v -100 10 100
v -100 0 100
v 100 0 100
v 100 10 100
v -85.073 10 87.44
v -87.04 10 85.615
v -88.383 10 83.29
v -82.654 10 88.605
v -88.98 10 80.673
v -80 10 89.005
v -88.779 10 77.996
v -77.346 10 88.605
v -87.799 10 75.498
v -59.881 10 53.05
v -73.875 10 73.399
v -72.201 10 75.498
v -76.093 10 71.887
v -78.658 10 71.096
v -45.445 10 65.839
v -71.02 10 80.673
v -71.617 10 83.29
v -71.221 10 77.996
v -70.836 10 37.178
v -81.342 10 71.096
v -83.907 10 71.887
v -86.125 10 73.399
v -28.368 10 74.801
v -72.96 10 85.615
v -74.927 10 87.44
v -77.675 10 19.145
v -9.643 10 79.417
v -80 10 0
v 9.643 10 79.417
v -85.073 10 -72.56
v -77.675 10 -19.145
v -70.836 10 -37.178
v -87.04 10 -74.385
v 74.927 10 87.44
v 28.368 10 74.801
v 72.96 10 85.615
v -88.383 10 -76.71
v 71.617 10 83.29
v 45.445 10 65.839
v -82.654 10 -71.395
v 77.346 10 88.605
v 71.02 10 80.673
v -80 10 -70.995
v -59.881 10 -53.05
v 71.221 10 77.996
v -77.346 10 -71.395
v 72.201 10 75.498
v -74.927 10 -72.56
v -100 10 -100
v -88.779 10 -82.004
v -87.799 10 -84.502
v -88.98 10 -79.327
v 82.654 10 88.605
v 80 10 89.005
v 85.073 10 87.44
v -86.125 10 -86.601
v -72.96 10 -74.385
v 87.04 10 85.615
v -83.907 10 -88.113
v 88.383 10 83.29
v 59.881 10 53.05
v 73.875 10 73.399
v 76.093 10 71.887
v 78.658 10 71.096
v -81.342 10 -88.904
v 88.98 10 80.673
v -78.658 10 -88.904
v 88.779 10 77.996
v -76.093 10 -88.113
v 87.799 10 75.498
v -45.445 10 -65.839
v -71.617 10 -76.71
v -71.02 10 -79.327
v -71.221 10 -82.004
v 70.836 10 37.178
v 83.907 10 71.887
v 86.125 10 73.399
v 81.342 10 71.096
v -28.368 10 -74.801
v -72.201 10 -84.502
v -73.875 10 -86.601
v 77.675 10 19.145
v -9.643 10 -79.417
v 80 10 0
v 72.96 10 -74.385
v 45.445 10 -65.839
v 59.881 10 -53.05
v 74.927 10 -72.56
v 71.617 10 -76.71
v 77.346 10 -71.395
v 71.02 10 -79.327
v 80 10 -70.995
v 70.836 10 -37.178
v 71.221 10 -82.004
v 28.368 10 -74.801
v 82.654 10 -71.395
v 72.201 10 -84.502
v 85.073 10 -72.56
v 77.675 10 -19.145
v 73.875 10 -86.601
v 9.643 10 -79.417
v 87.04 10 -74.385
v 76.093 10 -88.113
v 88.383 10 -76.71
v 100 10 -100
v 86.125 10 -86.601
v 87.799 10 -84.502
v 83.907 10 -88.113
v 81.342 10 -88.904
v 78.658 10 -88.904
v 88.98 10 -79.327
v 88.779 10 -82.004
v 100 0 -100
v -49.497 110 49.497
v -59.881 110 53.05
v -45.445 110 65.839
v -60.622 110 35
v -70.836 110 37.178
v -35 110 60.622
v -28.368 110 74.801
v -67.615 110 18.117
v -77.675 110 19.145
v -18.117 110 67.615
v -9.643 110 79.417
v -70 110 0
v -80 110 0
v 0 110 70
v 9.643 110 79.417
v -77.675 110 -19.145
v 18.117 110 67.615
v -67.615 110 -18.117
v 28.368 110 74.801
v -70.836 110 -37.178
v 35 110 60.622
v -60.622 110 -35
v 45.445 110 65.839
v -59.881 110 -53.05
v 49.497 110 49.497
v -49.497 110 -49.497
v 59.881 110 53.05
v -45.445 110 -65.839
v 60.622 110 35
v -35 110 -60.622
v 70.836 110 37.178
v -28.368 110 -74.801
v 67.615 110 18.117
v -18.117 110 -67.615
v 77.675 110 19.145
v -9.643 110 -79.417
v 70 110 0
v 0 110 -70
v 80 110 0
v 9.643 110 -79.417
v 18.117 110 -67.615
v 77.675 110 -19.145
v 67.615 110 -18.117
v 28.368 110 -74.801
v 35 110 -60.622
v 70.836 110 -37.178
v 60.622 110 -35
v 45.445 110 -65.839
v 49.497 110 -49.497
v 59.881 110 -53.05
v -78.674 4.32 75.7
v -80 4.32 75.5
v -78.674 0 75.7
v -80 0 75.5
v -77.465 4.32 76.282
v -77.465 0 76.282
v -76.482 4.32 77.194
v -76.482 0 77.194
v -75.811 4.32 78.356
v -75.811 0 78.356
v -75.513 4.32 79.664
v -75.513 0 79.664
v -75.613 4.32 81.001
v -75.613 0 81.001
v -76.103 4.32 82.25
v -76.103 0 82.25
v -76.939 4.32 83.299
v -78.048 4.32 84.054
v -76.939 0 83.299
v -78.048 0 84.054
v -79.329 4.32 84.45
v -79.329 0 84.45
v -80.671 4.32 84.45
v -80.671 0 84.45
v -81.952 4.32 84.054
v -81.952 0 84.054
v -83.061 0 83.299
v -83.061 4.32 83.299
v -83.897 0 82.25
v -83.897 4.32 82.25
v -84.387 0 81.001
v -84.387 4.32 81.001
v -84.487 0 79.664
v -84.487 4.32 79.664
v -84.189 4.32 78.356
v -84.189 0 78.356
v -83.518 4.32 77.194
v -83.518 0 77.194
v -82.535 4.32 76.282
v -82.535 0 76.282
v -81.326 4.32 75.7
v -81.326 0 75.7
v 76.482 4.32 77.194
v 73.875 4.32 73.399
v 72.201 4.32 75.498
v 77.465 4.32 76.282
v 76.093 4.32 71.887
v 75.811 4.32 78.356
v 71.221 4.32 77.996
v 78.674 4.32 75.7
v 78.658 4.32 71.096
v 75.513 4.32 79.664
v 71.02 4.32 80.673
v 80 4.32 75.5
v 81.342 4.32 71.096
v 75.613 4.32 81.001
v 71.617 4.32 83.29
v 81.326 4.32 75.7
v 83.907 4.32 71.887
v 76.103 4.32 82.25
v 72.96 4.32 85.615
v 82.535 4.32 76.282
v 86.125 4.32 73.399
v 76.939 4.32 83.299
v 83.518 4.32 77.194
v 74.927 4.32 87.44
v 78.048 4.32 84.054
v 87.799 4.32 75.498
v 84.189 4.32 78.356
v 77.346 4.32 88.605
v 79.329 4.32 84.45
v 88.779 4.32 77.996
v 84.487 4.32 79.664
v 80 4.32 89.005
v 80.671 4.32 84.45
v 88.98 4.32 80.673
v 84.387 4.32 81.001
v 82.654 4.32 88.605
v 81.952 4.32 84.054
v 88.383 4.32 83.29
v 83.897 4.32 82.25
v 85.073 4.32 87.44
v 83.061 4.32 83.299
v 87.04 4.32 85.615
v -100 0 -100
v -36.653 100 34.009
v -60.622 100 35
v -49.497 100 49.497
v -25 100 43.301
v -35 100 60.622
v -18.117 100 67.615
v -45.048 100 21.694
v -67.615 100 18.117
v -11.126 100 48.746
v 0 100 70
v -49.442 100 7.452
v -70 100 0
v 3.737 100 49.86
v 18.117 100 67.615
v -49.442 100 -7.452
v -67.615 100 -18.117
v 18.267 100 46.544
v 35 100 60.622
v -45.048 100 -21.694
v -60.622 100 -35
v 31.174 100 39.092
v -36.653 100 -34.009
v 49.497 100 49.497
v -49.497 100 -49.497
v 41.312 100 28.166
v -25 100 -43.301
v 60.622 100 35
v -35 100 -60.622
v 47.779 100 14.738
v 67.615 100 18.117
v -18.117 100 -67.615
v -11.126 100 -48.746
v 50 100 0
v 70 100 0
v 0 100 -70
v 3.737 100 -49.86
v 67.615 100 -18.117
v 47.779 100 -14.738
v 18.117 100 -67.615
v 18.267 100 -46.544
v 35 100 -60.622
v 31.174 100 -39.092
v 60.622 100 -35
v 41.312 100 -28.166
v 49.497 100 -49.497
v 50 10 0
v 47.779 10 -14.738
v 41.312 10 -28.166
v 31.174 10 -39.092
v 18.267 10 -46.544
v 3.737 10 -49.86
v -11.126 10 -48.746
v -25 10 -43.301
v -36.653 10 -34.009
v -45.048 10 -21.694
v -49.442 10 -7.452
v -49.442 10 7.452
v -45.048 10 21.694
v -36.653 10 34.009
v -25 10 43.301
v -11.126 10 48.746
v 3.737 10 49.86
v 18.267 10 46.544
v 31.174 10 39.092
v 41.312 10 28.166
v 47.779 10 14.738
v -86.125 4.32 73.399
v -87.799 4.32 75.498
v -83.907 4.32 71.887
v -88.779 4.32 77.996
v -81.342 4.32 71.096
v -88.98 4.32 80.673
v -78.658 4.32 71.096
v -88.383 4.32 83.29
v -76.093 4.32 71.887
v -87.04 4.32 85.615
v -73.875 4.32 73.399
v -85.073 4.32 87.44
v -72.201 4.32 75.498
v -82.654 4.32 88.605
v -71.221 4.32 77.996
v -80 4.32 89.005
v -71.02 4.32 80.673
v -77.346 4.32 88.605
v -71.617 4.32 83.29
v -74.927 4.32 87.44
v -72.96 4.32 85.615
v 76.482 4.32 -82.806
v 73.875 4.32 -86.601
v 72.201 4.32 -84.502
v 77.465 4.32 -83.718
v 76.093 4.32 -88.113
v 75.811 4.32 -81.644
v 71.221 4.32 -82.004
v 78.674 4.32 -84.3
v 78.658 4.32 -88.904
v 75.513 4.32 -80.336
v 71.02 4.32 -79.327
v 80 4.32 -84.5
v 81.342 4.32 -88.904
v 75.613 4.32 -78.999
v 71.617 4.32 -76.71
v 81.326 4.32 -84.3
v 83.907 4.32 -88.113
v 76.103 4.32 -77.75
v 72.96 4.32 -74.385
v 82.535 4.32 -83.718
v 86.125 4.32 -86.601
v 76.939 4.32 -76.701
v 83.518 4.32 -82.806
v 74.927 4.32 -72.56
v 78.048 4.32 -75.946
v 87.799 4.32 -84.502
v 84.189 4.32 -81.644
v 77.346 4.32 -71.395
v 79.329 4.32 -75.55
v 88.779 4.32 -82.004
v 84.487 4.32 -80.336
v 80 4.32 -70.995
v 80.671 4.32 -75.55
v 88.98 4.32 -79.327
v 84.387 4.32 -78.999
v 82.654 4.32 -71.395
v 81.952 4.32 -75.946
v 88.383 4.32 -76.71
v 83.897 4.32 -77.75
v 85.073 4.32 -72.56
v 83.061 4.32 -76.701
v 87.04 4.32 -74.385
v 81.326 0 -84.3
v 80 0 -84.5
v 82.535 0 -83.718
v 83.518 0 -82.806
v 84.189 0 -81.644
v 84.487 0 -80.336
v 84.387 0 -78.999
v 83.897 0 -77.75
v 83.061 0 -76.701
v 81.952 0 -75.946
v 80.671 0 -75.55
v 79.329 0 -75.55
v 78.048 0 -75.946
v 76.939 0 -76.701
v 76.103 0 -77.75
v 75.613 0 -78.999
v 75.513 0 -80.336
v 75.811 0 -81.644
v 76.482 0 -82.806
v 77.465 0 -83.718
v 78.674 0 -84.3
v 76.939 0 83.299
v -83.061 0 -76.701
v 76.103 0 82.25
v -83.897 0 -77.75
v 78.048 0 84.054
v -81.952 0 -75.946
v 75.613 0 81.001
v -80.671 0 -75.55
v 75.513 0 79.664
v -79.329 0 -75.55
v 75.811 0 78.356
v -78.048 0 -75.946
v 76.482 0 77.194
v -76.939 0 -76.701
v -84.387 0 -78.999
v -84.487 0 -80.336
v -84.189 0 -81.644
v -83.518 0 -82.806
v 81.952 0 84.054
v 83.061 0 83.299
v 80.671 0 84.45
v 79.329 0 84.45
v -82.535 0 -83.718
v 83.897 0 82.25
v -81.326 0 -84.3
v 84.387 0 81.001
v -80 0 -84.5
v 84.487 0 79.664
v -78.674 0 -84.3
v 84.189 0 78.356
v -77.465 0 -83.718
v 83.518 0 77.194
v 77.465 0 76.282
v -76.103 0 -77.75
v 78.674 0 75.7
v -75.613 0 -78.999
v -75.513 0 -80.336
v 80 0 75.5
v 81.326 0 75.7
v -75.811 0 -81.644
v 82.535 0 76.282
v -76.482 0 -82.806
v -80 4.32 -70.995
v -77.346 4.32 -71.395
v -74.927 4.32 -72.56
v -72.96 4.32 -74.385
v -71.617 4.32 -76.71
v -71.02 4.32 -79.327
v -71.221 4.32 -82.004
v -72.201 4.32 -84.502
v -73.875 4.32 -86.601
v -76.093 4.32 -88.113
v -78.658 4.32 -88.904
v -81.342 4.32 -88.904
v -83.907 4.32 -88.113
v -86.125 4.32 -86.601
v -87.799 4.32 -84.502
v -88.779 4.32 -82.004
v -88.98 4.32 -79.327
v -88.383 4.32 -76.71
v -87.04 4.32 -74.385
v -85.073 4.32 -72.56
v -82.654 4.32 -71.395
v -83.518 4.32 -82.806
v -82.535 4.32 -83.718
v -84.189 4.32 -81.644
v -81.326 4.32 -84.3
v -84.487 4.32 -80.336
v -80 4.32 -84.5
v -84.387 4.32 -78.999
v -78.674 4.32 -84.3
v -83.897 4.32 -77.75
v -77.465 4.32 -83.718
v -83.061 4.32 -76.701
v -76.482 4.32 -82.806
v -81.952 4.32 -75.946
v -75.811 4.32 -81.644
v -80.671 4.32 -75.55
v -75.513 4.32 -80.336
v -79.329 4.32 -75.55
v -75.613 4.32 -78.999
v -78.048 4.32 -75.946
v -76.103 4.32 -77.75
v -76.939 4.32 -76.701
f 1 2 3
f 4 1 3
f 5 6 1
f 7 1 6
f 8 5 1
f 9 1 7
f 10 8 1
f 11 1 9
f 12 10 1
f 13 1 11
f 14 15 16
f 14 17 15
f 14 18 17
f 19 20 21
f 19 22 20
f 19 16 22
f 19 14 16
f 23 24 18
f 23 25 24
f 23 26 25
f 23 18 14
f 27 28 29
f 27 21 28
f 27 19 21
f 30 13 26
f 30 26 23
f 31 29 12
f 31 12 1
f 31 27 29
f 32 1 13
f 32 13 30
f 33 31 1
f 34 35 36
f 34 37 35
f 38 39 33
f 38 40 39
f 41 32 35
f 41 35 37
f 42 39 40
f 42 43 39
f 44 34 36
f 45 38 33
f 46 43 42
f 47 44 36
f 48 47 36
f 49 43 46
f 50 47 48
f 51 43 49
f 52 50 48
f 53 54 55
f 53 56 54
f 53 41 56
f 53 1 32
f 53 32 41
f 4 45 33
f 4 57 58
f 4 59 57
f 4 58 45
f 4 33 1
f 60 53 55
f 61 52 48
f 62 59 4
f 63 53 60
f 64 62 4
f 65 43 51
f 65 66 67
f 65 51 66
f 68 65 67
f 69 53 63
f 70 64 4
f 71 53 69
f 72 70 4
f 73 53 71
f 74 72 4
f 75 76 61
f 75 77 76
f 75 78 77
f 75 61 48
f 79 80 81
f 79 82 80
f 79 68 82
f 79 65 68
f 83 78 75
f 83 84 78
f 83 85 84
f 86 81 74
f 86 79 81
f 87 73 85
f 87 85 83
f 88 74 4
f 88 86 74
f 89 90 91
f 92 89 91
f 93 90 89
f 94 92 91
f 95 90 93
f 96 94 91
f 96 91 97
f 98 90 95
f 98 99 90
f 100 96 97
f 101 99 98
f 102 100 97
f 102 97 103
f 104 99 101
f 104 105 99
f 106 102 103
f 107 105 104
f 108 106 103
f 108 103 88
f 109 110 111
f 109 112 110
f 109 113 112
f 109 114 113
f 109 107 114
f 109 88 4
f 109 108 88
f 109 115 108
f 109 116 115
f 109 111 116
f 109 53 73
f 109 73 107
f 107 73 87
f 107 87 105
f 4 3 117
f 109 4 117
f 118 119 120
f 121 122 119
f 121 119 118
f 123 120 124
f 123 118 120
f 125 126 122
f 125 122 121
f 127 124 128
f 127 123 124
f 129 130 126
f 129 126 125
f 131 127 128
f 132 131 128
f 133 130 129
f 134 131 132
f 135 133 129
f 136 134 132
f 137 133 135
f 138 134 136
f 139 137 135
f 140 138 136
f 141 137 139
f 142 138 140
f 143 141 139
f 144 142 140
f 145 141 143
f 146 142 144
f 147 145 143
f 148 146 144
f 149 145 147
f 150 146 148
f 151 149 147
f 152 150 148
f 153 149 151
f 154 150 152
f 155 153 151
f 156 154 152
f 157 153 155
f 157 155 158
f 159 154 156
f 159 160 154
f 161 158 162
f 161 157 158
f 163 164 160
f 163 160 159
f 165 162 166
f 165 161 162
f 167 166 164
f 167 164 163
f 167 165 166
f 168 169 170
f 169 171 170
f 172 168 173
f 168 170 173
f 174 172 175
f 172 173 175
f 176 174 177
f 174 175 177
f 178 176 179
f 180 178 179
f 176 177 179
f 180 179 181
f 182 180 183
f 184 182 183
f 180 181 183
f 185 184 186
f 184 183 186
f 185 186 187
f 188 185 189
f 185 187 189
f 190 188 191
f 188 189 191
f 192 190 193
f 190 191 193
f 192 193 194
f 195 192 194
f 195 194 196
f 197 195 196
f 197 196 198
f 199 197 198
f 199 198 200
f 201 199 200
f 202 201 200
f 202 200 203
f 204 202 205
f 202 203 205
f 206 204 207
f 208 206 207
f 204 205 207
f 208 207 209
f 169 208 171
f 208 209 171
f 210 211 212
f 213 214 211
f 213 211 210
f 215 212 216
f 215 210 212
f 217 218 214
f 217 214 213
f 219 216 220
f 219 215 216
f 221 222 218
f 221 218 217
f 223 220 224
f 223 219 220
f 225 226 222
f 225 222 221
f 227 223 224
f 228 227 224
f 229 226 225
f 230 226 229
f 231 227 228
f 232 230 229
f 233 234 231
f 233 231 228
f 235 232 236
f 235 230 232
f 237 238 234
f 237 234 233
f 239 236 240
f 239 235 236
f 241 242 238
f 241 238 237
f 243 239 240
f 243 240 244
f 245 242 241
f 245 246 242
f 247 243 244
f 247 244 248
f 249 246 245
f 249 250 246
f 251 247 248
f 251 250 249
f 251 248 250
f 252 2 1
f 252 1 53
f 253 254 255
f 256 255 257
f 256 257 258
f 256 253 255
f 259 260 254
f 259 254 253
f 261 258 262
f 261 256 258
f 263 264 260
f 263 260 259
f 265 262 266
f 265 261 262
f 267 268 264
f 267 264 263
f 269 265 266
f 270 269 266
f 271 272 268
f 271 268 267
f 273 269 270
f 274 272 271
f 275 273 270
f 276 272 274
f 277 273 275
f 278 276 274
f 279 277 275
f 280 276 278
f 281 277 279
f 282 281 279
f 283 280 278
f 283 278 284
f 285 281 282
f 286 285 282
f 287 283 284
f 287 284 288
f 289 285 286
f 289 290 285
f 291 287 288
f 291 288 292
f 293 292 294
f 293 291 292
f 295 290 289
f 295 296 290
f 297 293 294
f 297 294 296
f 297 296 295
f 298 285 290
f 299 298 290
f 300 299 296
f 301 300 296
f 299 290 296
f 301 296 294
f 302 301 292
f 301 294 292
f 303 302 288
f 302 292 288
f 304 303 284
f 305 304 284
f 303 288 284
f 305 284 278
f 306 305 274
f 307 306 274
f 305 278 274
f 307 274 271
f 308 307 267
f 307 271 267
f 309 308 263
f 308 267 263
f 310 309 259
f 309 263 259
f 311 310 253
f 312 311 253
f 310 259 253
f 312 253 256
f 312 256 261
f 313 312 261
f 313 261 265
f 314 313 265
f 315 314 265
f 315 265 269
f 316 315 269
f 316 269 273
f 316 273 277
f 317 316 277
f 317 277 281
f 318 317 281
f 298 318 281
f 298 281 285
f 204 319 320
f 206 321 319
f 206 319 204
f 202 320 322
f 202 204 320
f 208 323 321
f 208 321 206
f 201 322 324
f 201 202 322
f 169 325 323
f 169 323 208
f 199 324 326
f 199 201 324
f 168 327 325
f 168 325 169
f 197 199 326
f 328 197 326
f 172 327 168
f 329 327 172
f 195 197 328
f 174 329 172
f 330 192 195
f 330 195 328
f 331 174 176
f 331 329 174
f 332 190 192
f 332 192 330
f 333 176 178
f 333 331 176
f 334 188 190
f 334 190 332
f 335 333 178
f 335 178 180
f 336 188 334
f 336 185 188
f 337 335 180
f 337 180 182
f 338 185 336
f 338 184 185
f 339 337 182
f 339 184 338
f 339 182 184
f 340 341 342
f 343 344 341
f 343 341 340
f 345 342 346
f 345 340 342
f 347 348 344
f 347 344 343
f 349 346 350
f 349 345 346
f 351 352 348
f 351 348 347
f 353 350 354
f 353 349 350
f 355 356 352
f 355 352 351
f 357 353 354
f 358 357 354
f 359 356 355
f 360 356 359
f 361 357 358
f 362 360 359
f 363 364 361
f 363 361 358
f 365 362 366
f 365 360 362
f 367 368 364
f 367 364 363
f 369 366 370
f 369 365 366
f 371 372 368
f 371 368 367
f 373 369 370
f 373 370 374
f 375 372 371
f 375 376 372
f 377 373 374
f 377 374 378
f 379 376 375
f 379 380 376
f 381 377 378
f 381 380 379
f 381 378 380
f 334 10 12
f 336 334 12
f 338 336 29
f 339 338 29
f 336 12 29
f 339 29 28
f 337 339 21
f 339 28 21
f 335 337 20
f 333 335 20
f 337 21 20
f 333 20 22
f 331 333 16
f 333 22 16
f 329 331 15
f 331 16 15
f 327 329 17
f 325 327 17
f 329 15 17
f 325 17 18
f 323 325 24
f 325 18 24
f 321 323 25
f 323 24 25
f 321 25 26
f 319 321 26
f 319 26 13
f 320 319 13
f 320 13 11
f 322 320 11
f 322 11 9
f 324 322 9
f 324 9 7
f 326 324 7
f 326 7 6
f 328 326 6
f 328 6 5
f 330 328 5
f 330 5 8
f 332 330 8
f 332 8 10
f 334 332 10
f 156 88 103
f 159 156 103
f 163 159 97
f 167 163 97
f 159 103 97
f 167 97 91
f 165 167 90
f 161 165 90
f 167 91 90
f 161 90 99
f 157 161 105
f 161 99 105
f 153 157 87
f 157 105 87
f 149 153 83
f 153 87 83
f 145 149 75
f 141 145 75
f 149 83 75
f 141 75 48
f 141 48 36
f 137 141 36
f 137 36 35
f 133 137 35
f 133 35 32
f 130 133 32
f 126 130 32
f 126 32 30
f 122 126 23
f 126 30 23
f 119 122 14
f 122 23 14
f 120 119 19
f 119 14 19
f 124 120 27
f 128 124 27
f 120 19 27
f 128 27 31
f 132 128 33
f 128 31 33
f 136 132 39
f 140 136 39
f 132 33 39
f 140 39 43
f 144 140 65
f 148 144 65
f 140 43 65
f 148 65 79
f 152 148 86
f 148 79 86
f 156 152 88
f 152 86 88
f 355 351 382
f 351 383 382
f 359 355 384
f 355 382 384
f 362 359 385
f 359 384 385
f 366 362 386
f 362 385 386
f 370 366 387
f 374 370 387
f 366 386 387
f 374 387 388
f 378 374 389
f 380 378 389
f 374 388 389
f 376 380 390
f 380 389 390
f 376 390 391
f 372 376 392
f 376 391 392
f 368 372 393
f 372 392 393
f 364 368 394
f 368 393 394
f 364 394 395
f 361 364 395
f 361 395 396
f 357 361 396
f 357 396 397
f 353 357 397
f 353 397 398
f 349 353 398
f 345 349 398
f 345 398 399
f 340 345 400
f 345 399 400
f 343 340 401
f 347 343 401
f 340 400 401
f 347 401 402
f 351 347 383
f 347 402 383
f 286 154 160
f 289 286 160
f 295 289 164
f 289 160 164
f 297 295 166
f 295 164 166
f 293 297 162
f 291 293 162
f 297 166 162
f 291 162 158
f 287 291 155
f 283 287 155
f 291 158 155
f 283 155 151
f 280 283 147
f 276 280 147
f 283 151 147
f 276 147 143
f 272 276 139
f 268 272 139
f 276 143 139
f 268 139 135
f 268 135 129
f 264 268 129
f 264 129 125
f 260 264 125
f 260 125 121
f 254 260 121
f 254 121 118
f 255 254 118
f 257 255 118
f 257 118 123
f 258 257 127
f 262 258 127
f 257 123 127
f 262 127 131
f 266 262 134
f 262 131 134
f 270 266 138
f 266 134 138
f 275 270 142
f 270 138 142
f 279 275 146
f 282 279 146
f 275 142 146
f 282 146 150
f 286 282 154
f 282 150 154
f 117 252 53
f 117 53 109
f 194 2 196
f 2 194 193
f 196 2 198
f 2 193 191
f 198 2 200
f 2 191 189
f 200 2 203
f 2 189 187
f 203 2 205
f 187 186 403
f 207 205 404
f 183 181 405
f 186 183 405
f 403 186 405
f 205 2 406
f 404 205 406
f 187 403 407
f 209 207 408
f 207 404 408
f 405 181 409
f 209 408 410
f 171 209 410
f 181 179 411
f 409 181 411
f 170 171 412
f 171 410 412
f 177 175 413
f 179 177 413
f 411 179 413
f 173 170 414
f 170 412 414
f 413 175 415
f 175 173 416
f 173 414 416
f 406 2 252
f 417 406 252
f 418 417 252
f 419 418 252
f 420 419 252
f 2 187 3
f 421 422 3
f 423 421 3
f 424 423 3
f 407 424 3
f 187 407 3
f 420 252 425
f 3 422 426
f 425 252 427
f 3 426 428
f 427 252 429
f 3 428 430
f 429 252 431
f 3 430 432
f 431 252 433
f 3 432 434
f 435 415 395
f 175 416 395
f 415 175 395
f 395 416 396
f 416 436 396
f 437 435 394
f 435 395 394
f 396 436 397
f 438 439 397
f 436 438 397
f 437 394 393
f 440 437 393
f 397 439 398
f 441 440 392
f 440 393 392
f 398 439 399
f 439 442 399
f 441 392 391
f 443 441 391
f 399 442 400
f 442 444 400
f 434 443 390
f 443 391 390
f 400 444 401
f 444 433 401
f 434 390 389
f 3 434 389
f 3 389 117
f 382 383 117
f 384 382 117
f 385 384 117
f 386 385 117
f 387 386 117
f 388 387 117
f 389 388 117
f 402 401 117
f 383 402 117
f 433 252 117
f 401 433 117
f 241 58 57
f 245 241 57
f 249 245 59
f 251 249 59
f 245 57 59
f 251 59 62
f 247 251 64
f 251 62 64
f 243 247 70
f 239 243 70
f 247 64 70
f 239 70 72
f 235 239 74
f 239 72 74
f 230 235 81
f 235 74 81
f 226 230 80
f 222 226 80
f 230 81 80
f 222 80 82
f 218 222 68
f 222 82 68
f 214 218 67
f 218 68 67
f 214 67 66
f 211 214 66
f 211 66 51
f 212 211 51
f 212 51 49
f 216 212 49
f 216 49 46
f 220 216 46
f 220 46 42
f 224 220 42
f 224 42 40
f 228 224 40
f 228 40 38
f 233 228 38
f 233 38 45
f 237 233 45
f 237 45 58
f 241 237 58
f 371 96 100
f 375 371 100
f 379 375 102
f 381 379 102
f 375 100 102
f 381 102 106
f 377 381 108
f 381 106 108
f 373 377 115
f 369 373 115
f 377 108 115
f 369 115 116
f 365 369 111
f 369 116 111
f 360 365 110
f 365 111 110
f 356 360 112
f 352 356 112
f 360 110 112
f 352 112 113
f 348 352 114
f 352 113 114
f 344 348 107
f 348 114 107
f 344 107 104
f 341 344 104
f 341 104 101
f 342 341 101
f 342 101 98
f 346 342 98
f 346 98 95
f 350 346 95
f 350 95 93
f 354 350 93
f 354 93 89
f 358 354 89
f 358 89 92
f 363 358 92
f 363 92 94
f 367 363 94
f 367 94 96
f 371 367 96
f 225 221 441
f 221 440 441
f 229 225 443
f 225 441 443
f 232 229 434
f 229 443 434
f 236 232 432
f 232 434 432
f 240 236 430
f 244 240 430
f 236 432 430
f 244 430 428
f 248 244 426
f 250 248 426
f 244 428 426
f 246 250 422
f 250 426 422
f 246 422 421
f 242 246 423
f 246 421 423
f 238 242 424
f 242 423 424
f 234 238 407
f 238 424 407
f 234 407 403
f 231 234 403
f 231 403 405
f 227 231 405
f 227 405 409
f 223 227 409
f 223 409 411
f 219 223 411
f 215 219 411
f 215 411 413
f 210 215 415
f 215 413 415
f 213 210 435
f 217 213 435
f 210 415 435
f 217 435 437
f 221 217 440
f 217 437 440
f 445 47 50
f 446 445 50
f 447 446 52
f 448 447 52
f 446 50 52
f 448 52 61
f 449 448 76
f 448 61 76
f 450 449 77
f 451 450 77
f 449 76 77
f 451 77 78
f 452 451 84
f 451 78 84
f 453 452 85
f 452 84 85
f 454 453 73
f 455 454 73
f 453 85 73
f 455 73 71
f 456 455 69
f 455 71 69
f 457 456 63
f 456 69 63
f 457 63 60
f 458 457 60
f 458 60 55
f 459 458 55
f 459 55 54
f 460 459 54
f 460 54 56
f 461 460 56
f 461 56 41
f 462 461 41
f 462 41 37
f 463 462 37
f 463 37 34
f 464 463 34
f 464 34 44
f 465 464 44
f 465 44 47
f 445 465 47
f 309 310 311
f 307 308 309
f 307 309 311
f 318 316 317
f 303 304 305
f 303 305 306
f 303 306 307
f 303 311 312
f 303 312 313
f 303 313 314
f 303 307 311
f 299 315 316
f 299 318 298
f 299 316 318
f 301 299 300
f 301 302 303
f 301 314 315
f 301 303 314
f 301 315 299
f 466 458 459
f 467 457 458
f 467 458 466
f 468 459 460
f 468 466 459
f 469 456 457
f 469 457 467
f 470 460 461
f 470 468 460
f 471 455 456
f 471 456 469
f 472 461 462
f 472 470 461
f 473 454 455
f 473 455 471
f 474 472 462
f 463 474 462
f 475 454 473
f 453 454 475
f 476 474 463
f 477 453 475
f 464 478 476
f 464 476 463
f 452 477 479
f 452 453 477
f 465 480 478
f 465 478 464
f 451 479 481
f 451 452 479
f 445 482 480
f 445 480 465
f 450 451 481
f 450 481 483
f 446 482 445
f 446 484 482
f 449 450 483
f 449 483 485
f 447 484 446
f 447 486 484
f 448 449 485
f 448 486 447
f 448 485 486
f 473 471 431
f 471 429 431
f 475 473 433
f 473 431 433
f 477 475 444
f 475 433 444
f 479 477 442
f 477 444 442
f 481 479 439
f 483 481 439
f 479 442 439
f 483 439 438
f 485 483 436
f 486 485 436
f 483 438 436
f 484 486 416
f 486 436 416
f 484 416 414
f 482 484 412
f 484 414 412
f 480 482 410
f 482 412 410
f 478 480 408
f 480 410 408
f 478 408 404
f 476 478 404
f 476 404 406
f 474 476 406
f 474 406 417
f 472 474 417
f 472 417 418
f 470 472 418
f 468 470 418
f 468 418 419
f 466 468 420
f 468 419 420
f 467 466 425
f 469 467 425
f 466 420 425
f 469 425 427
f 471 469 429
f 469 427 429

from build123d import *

# Parameters (mm, degrees)
SKETCH1_W                               = 200
SKETCH1_H                               = 200
BOSS_EXTRUDE1_DEPTH                     = 10
SKETCH2_R                               = 80
BOSS_EXTRUDE2_DEPTH                     = 100
SKETCH3_R                               = 50
CUT_EXTRUDE1_DEPTH                      = 100
SKETCH4_R                               = 70
CUT_EXTRUDE2_DEPTH                      = 10
CBORE_FOR_M8_HEX_HEAD_BOLT1_D           = 9
CBORE_FOR_M8_HEX_HEAD_BOLT1_CBORE_D     = 18.01
CBORE_FOR_M8_HEX_HEAD_BOLT1_CBORE_DEPTH = 5.68


with BuildPart() as part:
    # Sketch1 → Boss-Extrude1 (new body)
    with BuildSketch(Plane(origin=(0, 0, 0), x_dir=(1, 0, 0), z_dir=(0, 1, 0))):
        Rectangle(SKETCH1_W, SKETCH1_H)
    extrude(amount=BOSS_EXTRUDE1_DEPTH)

    # Sketch2 → Boss-Extrude2 (add)
    with BuildSketch(Plane(origin=(0, 10, 0), x_dir=(1, 0, 0), z_dir=(0, 1, 0))):
        Circle(SKETCH2_R)
    extrude(amount=BOSS_EXTRUDE2_DEPTH)

    # Sketch3 → Cut-Extrude1 (cut)
    with BuildSketch(Plane(origin=(0, 110, 0), x_dir=(1, 0, 0), z_dir=(0, 1, 0))):
        Circle(SKETCH3_R)
    extrude(amount=-CUT_EXTRUDE1_DEPTH, mode=Mode.SUBTRACT)

    # Sketch4 → Cut-Extrude2 (cut)
    with BuildSketch(Plane(origin=(0, 110, 0), x_dir=(1, 0, 0), z_dir=(0, 1, 0))):
        Circle(SKETCH4_R)
    extrude(amount=-CUT_EXTRUDE2_DEPTH, mode=Mode.SUBTRACT)

    # CBORE for M8 Hex Head Bolt1 (through all)
    with Locations(Plane(origin=(80, 10, -80), x_dir=(0, 0, 1), z_dir=(0, 1, 0))):
        with Locations((0, 0), (0, -160), (160, 0), (160, -160)):
            CounterBoreHole(CBORE_FOR_M8_HEX_HEAD_BOLT1_D / 2, CBORE_FOR_M8_HEX_HEAD_BOLT1_CBORE_D / 2, CBORE_FOR_M8_HEX_HEAD_BOLT1_CBORE_DEPTH)


solid = part.part
